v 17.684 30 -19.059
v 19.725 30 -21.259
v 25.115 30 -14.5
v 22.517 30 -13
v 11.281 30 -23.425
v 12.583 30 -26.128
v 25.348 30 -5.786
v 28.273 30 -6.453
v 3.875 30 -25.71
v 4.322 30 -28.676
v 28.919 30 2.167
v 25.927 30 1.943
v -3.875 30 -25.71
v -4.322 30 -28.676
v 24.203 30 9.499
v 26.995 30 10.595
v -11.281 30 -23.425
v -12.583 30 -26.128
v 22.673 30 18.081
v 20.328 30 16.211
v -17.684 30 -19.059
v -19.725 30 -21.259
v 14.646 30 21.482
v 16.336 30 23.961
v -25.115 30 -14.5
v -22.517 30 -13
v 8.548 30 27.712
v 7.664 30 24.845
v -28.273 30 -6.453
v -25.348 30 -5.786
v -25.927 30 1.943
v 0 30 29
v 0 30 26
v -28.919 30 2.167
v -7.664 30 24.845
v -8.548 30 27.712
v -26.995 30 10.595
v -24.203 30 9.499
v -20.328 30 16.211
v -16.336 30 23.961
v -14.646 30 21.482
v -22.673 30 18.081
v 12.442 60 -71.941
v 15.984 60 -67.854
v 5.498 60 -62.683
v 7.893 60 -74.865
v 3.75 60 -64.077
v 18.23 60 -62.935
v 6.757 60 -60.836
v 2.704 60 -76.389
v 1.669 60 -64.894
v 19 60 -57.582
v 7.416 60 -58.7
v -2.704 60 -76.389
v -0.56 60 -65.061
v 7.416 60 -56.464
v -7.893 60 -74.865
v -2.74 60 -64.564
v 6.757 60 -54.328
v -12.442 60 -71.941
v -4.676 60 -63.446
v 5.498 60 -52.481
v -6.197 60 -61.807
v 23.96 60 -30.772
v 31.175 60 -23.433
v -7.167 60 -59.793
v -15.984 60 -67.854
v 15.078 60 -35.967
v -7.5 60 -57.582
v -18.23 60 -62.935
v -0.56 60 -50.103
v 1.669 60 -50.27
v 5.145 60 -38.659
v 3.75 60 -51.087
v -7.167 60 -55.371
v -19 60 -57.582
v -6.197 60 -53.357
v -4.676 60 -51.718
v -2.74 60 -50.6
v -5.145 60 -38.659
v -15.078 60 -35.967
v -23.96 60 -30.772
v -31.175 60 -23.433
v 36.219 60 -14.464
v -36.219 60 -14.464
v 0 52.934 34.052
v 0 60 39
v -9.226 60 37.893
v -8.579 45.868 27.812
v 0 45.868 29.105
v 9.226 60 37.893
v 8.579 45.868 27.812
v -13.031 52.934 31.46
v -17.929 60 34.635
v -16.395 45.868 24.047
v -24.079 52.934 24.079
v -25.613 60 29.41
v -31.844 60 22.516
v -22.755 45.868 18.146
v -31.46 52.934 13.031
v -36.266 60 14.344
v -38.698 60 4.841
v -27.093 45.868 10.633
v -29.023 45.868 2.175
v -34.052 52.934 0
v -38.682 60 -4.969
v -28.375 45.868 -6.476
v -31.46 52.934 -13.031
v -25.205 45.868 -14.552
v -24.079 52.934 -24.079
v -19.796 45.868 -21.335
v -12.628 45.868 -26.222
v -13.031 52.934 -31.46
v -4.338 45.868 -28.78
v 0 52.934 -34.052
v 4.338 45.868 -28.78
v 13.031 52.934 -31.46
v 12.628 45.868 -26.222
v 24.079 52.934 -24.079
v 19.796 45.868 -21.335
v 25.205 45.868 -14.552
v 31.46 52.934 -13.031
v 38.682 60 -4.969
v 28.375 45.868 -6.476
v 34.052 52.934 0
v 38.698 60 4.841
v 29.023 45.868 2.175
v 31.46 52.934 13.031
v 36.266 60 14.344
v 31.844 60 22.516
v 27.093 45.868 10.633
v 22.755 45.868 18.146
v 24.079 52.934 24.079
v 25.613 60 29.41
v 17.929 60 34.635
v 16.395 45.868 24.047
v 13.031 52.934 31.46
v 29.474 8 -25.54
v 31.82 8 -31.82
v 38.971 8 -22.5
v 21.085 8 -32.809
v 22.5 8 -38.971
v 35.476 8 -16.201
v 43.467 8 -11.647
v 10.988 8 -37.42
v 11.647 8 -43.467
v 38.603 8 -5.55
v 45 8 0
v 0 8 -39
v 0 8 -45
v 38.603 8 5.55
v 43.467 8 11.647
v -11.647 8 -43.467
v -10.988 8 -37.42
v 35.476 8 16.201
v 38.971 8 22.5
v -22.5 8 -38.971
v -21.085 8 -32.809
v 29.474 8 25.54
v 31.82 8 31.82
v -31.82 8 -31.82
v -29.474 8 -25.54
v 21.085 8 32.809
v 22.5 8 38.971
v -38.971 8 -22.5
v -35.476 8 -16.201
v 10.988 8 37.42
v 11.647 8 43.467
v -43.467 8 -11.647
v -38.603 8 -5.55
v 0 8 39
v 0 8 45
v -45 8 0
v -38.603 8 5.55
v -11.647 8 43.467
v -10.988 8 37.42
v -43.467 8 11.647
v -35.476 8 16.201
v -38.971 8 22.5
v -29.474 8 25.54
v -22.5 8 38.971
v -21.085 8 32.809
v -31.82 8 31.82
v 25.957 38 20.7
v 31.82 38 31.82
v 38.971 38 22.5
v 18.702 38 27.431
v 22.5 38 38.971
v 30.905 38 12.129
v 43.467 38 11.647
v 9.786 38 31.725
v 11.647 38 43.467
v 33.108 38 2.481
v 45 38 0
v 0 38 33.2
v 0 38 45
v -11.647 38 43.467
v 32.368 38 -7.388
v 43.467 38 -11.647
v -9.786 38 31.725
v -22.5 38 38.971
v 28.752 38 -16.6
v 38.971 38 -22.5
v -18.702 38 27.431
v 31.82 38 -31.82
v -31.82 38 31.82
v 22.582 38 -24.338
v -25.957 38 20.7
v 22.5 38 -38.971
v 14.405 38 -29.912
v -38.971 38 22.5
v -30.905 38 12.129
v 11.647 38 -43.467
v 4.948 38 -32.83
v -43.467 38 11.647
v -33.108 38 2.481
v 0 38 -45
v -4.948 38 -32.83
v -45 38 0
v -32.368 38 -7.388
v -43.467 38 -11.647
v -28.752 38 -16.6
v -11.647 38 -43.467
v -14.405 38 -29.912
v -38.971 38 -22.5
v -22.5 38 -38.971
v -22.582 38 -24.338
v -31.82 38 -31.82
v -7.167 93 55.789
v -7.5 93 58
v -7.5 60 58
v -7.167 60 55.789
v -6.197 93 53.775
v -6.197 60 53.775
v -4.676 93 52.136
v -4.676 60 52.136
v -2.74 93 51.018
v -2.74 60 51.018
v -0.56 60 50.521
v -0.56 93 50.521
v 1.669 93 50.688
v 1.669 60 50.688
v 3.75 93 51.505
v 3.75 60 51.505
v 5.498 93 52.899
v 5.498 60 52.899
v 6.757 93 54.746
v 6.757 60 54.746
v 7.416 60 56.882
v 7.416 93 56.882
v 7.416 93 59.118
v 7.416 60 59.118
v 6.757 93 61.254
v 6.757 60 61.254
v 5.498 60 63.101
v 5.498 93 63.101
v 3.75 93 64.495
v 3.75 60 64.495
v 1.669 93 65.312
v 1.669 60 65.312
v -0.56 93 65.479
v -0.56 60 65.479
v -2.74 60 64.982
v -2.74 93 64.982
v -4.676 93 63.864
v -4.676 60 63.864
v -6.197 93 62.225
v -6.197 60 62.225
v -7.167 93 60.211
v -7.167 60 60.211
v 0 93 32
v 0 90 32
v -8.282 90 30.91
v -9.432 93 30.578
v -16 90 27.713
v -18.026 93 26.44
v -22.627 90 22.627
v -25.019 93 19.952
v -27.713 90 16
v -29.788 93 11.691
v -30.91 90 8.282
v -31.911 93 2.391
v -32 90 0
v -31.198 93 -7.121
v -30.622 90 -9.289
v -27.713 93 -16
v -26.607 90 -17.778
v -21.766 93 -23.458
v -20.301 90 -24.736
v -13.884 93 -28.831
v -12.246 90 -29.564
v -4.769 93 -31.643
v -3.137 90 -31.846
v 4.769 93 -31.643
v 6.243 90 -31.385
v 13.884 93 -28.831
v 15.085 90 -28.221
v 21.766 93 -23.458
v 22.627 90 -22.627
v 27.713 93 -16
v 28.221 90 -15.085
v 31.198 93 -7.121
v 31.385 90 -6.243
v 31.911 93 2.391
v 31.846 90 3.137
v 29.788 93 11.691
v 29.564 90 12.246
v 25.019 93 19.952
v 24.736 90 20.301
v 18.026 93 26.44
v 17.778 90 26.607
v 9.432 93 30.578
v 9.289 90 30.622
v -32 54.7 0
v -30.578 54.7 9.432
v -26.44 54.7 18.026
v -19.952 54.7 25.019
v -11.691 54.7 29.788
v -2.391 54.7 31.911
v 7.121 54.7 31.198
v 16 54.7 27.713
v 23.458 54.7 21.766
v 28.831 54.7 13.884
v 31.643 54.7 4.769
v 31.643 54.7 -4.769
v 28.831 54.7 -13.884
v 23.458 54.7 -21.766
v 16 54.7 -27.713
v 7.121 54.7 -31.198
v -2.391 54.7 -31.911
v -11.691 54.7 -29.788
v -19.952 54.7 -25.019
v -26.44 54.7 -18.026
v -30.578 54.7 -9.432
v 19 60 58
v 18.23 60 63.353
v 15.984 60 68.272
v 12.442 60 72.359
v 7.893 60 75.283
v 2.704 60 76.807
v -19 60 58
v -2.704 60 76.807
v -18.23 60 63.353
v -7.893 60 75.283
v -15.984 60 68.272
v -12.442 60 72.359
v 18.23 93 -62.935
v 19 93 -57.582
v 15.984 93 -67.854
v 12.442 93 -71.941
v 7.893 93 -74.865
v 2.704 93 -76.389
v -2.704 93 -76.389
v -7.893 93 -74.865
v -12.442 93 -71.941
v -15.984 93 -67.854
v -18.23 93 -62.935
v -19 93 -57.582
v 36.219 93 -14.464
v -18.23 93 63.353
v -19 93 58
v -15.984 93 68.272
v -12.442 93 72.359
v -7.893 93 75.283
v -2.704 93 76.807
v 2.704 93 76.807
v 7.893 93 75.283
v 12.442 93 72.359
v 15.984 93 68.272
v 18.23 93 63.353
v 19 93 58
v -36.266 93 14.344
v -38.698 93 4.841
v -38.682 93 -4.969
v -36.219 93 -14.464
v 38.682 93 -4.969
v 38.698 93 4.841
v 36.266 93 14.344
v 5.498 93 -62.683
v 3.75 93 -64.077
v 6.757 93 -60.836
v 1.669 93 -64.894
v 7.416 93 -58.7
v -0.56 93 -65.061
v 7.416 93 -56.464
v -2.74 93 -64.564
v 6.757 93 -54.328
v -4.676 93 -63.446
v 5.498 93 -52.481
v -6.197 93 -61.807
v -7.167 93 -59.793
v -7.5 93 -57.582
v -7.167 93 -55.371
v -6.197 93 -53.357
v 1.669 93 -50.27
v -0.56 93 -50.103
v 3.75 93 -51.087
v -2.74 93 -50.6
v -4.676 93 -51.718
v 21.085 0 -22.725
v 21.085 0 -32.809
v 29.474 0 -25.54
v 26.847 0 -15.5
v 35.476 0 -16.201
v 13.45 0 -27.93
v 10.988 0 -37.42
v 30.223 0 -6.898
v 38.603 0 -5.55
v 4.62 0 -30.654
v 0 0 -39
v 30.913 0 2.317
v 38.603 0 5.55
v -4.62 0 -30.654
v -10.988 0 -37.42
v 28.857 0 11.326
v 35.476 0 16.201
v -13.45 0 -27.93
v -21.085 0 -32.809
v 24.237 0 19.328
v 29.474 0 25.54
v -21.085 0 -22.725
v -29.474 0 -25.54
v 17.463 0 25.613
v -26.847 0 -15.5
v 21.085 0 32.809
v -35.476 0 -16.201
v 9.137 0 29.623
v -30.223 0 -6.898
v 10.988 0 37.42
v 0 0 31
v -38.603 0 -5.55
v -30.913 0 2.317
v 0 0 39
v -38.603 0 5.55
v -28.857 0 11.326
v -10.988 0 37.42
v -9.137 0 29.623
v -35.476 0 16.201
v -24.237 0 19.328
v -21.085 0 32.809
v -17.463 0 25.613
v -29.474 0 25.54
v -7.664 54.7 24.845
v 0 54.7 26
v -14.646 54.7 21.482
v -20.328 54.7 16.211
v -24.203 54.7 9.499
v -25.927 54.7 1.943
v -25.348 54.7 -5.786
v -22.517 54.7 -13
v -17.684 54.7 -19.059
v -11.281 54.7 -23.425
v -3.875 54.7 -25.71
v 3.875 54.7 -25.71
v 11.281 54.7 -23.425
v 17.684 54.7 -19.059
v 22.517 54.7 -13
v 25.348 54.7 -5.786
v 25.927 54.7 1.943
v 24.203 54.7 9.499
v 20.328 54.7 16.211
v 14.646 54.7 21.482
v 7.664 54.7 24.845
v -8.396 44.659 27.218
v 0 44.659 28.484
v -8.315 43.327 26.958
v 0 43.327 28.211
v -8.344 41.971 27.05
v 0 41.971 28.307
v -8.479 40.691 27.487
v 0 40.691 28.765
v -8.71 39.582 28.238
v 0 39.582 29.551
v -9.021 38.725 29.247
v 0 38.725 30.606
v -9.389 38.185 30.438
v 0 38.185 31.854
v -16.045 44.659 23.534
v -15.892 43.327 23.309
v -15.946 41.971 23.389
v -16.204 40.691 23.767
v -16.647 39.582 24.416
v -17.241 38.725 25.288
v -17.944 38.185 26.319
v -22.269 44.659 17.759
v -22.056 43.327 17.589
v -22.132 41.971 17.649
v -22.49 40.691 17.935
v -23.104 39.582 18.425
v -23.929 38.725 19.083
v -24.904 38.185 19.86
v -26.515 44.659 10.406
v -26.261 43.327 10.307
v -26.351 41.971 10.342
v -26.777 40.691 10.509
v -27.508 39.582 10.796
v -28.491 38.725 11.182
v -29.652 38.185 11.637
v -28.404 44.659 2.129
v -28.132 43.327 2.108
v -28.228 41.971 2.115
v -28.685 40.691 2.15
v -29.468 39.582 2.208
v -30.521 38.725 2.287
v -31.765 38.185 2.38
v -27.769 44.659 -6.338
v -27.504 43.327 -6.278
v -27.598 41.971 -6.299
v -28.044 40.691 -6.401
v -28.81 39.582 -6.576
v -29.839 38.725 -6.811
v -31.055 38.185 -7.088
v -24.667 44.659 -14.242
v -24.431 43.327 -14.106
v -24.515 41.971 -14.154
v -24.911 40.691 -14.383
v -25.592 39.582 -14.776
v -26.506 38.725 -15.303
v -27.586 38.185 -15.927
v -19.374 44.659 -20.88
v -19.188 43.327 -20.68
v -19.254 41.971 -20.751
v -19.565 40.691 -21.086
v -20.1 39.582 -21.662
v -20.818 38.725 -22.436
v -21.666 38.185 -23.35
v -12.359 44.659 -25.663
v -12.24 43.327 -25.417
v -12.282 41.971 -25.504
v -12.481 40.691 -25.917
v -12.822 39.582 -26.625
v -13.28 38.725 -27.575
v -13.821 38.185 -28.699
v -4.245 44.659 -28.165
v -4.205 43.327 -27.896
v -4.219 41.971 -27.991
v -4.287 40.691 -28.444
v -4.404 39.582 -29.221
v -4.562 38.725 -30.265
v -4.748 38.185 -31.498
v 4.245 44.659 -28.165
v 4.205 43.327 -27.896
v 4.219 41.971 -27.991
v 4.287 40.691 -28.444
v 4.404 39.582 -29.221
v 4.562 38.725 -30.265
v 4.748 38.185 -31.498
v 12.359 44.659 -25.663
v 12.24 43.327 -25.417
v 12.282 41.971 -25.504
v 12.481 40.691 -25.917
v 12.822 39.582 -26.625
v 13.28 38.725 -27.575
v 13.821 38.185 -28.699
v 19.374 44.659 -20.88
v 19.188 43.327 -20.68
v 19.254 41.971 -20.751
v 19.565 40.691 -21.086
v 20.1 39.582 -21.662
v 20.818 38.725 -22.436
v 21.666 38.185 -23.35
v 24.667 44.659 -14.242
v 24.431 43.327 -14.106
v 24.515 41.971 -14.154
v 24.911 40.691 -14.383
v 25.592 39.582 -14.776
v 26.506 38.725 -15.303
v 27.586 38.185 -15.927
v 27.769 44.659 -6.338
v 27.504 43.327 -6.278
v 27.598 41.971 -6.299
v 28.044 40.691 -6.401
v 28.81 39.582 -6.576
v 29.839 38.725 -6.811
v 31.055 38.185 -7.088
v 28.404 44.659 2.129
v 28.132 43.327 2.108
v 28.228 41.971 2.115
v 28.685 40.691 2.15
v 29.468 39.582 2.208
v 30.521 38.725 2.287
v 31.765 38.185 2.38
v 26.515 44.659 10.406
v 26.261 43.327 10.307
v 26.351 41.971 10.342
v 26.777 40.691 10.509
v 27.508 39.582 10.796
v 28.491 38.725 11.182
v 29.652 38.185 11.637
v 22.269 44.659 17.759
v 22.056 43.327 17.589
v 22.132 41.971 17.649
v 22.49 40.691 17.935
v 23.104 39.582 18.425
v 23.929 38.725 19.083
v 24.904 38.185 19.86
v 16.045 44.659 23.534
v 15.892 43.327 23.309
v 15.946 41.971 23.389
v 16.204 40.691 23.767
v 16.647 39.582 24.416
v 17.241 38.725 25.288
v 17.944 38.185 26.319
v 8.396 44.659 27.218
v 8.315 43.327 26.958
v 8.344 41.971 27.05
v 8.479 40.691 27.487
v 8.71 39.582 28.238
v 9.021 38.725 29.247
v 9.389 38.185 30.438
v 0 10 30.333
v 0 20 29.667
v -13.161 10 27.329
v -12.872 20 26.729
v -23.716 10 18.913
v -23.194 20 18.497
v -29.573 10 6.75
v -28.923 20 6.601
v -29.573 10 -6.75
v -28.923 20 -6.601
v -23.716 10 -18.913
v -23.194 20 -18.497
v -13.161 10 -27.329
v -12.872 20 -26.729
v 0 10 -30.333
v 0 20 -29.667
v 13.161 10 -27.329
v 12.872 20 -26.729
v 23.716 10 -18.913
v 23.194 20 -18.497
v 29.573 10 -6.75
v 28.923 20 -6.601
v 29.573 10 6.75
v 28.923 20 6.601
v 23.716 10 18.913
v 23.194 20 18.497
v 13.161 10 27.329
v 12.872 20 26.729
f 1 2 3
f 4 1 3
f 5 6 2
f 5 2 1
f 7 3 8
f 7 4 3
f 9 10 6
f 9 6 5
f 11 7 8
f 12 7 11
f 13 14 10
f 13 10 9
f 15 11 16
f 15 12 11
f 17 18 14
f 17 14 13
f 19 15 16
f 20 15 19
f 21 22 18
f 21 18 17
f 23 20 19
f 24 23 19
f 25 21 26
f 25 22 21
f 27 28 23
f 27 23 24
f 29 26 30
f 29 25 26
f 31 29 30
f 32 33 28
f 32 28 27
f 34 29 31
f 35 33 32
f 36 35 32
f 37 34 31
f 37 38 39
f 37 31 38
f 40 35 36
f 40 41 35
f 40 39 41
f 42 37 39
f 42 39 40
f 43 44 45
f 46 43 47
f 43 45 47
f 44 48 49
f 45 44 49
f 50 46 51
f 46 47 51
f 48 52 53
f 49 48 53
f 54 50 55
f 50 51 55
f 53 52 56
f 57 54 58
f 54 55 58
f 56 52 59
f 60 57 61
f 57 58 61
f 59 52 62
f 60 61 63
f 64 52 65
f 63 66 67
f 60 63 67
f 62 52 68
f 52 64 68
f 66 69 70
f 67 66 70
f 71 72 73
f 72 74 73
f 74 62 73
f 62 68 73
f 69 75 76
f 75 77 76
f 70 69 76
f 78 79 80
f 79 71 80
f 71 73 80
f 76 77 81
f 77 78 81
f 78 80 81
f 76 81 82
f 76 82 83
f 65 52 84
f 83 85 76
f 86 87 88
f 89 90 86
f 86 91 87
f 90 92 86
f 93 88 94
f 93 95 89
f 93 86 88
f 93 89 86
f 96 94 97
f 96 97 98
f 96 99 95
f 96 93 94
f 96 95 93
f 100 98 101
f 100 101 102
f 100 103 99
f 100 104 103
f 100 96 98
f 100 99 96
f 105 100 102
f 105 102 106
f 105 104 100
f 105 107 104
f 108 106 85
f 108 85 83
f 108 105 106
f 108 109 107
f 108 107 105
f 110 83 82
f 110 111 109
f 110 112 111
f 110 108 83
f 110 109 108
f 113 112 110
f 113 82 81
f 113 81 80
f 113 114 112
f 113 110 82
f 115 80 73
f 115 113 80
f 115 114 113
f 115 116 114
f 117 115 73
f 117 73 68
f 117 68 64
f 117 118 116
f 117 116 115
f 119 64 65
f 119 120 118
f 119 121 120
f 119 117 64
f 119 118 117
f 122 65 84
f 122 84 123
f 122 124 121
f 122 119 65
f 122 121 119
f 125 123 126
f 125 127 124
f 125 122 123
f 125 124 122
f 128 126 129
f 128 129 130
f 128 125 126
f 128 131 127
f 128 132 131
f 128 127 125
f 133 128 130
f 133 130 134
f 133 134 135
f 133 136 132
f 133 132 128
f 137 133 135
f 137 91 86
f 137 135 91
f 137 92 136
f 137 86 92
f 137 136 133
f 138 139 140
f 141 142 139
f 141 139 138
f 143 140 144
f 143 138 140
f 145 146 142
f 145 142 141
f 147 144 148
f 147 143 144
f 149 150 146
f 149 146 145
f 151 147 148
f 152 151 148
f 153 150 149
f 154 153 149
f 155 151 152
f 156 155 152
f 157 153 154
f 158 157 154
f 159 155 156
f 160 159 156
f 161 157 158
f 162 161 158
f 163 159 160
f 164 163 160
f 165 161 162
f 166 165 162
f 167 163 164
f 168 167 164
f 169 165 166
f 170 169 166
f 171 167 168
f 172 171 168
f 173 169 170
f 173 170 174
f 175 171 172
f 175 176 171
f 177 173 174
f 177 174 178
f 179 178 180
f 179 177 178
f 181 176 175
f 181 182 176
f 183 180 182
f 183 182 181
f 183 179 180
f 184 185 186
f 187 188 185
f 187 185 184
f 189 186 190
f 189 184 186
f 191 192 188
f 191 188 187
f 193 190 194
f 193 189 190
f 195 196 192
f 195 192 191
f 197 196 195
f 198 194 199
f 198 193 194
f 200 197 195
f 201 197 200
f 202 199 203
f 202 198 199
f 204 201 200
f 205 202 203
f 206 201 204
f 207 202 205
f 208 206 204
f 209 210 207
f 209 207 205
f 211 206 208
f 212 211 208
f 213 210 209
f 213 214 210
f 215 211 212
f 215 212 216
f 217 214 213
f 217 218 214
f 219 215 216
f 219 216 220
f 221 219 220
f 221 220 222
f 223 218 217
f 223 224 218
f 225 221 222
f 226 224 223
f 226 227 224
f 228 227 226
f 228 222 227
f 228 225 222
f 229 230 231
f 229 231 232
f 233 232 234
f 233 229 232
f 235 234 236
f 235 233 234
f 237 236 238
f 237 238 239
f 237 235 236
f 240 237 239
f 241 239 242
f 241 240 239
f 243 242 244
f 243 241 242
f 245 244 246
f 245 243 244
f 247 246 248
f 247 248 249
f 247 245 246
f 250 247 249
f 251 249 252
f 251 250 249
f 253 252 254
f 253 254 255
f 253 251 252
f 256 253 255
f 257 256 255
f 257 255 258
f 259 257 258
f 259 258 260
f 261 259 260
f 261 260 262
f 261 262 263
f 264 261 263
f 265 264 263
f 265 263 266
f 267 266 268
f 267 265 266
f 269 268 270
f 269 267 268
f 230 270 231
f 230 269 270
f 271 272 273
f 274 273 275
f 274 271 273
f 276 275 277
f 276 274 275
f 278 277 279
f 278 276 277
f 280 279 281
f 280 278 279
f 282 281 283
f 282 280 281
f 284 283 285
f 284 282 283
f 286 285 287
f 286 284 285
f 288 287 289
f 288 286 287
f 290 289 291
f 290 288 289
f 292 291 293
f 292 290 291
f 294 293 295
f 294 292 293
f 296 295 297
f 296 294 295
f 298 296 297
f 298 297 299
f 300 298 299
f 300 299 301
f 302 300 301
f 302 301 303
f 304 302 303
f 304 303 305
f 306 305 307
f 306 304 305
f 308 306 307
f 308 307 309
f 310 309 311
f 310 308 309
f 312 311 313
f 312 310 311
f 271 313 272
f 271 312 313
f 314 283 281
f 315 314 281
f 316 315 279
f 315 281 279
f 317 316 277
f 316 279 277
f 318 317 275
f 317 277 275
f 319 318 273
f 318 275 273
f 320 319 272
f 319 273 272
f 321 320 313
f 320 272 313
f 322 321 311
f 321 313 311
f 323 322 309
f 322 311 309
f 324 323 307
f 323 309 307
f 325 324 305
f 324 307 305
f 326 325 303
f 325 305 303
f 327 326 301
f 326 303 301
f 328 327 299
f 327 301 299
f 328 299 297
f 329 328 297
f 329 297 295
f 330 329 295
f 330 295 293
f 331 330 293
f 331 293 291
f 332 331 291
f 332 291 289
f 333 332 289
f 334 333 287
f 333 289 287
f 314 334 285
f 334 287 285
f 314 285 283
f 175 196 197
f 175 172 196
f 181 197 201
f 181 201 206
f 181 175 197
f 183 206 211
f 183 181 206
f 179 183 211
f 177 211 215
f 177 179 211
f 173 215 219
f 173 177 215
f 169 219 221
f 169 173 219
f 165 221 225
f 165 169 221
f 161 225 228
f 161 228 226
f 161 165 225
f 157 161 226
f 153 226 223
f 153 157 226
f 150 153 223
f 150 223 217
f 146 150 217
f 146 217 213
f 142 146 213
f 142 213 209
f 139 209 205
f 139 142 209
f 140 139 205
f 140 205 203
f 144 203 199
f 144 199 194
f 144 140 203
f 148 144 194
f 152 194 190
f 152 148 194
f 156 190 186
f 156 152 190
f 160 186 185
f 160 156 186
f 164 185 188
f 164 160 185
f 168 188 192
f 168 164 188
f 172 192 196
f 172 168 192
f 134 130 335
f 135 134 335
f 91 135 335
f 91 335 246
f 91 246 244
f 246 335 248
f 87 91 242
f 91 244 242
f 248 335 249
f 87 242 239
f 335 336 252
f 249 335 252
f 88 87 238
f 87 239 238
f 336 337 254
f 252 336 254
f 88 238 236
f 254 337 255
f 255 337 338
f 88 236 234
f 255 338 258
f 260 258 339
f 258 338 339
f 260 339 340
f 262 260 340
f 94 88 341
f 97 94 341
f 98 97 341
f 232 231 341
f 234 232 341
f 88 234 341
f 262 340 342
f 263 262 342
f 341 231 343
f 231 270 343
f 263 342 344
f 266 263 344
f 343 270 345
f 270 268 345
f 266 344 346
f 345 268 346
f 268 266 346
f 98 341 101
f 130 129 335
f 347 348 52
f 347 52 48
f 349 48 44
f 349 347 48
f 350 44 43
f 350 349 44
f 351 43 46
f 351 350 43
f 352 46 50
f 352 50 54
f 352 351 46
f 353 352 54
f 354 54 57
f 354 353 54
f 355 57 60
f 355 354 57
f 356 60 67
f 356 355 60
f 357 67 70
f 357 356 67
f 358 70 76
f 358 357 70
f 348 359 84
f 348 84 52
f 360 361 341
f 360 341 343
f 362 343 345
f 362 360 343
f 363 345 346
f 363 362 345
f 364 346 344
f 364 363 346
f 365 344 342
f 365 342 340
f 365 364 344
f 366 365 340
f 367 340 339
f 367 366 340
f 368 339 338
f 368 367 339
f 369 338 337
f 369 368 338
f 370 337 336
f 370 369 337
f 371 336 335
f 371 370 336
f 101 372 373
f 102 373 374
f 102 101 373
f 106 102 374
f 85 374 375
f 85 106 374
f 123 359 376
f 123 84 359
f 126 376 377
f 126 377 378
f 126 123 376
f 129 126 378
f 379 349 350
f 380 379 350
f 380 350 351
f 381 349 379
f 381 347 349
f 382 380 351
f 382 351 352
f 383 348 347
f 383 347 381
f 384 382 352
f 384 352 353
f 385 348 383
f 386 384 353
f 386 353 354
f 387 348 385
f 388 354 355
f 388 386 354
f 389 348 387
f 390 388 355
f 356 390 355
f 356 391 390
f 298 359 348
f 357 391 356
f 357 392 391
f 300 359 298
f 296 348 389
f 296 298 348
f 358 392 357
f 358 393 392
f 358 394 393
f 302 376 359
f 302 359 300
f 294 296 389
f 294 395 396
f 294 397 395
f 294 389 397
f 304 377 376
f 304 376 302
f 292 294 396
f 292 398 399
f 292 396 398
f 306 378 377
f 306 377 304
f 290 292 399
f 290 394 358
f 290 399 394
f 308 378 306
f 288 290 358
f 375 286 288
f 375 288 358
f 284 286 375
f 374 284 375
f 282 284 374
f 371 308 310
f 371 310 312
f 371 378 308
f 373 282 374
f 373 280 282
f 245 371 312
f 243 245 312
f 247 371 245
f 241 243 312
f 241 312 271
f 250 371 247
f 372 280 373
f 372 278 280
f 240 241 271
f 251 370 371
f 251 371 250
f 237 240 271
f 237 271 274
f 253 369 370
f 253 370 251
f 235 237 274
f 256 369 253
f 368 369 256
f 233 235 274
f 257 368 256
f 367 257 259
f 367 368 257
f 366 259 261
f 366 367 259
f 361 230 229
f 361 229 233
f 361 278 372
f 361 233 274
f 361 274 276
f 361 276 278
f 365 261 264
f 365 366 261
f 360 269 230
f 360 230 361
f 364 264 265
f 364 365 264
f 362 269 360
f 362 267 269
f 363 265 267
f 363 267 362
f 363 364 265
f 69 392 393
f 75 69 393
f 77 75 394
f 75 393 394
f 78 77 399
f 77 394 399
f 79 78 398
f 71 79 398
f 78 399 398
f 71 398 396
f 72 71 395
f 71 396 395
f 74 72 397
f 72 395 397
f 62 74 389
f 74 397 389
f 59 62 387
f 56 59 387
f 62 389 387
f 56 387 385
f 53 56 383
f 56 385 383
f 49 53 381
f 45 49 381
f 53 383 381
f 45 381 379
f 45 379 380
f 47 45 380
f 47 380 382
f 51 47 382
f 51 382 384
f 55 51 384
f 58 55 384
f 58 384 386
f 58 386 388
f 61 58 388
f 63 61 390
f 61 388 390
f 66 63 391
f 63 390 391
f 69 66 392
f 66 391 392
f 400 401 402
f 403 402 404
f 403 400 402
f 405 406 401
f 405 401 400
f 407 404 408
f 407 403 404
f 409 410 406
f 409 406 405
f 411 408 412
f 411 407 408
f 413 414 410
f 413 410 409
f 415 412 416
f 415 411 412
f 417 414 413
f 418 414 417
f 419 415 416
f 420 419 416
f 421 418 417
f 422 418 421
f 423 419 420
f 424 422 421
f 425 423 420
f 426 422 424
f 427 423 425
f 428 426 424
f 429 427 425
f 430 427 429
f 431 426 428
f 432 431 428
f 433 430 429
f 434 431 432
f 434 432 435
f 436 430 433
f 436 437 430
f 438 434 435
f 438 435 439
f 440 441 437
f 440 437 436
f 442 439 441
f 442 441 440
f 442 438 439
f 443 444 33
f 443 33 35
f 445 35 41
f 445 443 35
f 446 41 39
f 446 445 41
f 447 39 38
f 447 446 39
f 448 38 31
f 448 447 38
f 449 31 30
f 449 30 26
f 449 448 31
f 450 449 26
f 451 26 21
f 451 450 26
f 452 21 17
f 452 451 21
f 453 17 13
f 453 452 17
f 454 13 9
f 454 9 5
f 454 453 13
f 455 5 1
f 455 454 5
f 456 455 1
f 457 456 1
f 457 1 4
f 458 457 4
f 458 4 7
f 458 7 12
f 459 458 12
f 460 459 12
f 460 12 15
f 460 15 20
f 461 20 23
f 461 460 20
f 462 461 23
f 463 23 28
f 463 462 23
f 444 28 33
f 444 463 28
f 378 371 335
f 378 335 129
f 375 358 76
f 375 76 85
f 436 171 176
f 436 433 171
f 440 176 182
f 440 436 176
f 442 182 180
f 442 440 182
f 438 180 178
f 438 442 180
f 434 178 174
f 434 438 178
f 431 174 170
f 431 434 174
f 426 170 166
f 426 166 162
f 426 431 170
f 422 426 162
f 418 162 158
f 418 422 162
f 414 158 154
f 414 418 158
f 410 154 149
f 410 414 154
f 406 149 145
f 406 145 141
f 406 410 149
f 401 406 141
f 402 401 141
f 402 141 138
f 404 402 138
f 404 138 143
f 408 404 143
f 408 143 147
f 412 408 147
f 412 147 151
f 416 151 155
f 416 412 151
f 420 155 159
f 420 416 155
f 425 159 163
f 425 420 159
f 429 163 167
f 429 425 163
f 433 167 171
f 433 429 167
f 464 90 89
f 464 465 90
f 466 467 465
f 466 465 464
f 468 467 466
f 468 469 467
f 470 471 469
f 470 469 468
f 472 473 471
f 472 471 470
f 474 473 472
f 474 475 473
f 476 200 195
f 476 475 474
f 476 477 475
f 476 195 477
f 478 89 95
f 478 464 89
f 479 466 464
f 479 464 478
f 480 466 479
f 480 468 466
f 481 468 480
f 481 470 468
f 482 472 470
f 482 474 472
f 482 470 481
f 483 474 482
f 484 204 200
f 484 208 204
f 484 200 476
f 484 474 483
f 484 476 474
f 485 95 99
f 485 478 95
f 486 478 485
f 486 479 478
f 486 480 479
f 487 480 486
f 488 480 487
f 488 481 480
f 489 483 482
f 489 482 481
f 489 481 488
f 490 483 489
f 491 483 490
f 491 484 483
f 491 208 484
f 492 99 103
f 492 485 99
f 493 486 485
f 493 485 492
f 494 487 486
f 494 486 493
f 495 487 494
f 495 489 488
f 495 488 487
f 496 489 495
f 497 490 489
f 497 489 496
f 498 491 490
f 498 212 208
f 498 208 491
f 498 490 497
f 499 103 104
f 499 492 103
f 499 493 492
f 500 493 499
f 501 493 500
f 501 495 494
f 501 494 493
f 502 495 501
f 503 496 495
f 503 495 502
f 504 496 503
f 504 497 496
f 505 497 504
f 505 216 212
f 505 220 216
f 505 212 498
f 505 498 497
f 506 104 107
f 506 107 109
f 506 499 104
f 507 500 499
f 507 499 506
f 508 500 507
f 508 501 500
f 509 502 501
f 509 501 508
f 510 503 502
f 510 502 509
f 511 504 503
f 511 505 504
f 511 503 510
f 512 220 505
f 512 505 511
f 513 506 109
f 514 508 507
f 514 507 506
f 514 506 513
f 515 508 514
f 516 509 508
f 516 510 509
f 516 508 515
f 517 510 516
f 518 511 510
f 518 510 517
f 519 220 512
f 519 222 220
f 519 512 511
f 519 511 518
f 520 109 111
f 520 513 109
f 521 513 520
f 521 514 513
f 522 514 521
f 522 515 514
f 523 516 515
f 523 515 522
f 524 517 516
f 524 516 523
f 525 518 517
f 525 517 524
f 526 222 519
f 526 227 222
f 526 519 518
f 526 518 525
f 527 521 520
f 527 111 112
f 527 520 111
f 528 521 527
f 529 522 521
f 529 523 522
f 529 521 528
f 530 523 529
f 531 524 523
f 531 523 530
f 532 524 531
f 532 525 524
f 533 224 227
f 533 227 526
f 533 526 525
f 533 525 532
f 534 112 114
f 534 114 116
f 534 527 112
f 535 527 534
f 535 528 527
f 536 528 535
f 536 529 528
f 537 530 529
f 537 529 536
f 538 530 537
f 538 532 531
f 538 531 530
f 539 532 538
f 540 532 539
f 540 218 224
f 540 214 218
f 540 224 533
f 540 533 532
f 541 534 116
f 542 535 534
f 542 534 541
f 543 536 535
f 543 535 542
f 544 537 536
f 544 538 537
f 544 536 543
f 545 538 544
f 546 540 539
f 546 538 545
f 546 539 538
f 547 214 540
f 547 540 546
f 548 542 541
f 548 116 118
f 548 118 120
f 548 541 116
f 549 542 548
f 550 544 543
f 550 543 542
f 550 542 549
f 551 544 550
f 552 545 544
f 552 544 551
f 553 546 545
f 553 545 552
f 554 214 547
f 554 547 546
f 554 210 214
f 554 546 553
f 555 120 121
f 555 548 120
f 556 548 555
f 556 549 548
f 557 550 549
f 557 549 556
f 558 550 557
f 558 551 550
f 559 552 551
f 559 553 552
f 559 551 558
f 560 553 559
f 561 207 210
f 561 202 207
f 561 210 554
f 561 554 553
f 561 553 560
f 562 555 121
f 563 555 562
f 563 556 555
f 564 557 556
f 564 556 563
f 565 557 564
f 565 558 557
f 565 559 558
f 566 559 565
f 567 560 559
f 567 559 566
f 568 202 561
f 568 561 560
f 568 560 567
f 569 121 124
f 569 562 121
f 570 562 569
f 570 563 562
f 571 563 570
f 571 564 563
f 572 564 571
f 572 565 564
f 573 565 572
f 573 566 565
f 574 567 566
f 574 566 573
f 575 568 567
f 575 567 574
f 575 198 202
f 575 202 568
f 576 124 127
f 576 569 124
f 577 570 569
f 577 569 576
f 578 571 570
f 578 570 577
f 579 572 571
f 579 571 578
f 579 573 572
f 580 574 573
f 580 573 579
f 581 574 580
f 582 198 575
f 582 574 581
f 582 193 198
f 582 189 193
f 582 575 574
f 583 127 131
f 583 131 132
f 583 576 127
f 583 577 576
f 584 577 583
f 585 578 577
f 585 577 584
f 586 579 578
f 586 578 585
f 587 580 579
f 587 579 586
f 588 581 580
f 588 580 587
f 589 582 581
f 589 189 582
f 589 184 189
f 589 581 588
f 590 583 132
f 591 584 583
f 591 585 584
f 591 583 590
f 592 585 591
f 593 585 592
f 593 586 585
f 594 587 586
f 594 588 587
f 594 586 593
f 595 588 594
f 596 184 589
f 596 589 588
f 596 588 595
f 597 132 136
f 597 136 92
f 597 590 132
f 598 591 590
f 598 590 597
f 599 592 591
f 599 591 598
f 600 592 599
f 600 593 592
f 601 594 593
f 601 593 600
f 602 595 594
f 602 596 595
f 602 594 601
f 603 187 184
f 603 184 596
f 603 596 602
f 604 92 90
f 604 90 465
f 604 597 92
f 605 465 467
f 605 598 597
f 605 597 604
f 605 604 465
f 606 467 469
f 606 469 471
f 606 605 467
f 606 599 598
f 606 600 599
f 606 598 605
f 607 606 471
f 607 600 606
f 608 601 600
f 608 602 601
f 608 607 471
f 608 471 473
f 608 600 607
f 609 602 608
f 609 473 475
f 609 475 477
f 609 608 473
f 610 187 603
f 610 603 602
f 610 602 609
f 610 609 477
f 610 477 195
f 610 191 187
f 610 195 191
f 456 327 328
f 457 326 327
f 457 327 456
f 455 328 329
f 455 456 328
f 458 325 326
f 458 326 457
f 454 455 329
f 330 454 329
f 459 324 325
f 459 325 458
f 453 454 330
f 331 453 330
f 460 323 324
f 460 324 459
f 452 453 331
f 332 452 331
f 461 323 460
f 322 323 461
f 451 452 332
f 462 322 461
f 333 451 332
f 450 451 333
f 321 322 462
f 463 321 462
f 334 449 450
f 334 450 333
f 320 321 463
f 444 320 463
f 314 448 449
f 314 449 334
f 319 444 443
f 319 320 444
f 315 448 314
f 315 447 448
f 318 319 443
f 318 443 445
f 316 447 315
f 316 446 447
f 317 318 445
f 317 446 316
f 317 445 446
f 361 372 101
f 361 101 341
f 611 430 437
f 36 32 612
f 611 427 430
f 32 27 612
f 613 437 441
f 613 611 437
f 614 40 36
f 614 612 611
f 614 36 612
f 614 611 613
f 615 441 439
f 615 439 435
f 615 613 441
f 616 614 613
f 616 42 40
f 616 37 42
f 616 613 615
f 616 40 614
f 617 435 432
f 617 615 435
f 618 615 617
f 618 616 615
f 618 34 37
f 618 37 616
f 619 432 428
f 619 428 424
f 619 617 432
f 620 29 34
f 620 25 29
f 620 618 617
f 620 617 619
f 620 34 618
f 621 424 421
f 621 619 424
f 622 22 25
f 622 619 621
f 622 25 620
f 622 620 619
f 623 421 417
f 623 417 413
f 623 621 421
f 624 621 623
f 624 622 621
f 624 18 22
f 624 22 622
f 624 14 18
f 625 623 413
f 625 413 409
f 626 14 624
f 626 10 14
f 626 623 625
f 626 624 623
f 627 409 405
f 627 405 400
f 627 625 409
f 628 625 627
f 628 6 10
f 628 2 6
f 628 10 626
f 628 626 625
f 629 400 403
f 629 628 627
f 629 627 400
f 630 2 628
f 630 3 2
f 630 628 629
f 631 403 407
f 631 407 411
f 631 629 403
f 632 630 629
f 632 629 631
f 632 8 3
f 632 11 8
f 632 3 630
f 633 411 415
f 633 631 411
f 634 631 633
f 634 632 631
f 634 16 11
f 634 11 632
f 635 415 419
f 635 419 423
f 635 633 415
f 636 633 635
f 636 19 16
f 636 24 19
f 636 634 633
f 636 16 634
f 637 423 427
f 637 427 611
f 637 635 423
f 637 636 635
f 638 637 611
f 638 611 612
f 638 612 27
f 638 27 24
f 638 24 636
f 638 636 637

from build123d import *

# Parameters (mm, degrees)
F2_R     = 7.5
F3_DEPTH = 33
F4_R     = 32
F5_DEPTH = 35.3


with BuildPart() as f1:
    # F0 (on Right) → F1 (revolve)
    with BuildSketch(Plane.YZ):
        with BuildLine():
            Line((0, 39), (0, 31))
            Line((0, 31), (30, 29))
            Line((30, 29), (30, 26))
            Line((30, 26), (72, 26))
            Line((72, 26), (72, 0))
            Line((72, 0), (90, 0))
            Line((90, 0), (90, 32))
            Line((90, 32), (93, 32))
            Line((93, 32), (93, 39))
            Line((93, 39), (60, 39))
            Line((60, 39), (45.8678821818, 29.1045845728))
            ThreePointArc((45.8678821818, 29.1045845728), (40.6912569338, 28.7652906284), (38, 33.2003447942))
            Line((38, 33.2003447942), (38, 45))
            Line((38, 45), (8, 45))
            Line((8, 45), (8, 39))
            Line((8, 39), (0, 39))
        make_face()
    revolve(axis=Axis((0, 81, 0), (0, -1, 0)))

    # F2 (on face) → F3 (join)
    with BuildSketch(Plane(origin=(0, 93, 0), x_dir=(-1, 0, 0), z_dir=(0, 1, 0))):
        with BuildLine():
            Line((36.2664732052, 14.3437415362), (19, 58))
            ThreePointArc((19, 58), (0, 77), (-19, 58))
            Line((-19, 58), (-36.2664732052, 14.3437415362))
            ThreePointArc((-36.2664732052, 14.3437415362), (0, 39), (36.2664732052, 14.3437415362))
        make_face()
        with BuildLine():
            ThreePointArc((0, 65.5), (5.3033008589, 63.3033008589), (7.5, 58))
            ThreePointArc((7.5, 58), (-5.3033008589, 52.6966991411), (0, 65.5))
        make_face(mode=Mode.SUBTRACT)
        with BuildLine():
            ThreePointArc((36.2188499541, -14.463571758), (0, -39), (-36.2188499541, -14.463571758))
            Line((-36.2188499541, -14.463571758), (-19, -57.5820319355))
            ThreePointArc((-19, -57.5820319355), (0, -76.5820319355), (19, -57.5820319355))
            Line((19, -57.5820319355), (36.2188499541, -14.463571758))
        make_face()
        with Locations((0, -57.5820319355)):
            Circle(F2_R, mode=Mode.SUBTRACT)
    extrude(amount=-F3_DEPTH)

    # F4 (on face) → F5 (cut)
    with BuildSketch(Plane(origin=(0, 90, 0), x_dir=(-1, 0, 0), z_dir=(0, 1, 0))):
        Circle(F4_R)
    extrude(amount=-F5_DEPTH, mode=Mode.SUBTRACT)


solid = f1.part
